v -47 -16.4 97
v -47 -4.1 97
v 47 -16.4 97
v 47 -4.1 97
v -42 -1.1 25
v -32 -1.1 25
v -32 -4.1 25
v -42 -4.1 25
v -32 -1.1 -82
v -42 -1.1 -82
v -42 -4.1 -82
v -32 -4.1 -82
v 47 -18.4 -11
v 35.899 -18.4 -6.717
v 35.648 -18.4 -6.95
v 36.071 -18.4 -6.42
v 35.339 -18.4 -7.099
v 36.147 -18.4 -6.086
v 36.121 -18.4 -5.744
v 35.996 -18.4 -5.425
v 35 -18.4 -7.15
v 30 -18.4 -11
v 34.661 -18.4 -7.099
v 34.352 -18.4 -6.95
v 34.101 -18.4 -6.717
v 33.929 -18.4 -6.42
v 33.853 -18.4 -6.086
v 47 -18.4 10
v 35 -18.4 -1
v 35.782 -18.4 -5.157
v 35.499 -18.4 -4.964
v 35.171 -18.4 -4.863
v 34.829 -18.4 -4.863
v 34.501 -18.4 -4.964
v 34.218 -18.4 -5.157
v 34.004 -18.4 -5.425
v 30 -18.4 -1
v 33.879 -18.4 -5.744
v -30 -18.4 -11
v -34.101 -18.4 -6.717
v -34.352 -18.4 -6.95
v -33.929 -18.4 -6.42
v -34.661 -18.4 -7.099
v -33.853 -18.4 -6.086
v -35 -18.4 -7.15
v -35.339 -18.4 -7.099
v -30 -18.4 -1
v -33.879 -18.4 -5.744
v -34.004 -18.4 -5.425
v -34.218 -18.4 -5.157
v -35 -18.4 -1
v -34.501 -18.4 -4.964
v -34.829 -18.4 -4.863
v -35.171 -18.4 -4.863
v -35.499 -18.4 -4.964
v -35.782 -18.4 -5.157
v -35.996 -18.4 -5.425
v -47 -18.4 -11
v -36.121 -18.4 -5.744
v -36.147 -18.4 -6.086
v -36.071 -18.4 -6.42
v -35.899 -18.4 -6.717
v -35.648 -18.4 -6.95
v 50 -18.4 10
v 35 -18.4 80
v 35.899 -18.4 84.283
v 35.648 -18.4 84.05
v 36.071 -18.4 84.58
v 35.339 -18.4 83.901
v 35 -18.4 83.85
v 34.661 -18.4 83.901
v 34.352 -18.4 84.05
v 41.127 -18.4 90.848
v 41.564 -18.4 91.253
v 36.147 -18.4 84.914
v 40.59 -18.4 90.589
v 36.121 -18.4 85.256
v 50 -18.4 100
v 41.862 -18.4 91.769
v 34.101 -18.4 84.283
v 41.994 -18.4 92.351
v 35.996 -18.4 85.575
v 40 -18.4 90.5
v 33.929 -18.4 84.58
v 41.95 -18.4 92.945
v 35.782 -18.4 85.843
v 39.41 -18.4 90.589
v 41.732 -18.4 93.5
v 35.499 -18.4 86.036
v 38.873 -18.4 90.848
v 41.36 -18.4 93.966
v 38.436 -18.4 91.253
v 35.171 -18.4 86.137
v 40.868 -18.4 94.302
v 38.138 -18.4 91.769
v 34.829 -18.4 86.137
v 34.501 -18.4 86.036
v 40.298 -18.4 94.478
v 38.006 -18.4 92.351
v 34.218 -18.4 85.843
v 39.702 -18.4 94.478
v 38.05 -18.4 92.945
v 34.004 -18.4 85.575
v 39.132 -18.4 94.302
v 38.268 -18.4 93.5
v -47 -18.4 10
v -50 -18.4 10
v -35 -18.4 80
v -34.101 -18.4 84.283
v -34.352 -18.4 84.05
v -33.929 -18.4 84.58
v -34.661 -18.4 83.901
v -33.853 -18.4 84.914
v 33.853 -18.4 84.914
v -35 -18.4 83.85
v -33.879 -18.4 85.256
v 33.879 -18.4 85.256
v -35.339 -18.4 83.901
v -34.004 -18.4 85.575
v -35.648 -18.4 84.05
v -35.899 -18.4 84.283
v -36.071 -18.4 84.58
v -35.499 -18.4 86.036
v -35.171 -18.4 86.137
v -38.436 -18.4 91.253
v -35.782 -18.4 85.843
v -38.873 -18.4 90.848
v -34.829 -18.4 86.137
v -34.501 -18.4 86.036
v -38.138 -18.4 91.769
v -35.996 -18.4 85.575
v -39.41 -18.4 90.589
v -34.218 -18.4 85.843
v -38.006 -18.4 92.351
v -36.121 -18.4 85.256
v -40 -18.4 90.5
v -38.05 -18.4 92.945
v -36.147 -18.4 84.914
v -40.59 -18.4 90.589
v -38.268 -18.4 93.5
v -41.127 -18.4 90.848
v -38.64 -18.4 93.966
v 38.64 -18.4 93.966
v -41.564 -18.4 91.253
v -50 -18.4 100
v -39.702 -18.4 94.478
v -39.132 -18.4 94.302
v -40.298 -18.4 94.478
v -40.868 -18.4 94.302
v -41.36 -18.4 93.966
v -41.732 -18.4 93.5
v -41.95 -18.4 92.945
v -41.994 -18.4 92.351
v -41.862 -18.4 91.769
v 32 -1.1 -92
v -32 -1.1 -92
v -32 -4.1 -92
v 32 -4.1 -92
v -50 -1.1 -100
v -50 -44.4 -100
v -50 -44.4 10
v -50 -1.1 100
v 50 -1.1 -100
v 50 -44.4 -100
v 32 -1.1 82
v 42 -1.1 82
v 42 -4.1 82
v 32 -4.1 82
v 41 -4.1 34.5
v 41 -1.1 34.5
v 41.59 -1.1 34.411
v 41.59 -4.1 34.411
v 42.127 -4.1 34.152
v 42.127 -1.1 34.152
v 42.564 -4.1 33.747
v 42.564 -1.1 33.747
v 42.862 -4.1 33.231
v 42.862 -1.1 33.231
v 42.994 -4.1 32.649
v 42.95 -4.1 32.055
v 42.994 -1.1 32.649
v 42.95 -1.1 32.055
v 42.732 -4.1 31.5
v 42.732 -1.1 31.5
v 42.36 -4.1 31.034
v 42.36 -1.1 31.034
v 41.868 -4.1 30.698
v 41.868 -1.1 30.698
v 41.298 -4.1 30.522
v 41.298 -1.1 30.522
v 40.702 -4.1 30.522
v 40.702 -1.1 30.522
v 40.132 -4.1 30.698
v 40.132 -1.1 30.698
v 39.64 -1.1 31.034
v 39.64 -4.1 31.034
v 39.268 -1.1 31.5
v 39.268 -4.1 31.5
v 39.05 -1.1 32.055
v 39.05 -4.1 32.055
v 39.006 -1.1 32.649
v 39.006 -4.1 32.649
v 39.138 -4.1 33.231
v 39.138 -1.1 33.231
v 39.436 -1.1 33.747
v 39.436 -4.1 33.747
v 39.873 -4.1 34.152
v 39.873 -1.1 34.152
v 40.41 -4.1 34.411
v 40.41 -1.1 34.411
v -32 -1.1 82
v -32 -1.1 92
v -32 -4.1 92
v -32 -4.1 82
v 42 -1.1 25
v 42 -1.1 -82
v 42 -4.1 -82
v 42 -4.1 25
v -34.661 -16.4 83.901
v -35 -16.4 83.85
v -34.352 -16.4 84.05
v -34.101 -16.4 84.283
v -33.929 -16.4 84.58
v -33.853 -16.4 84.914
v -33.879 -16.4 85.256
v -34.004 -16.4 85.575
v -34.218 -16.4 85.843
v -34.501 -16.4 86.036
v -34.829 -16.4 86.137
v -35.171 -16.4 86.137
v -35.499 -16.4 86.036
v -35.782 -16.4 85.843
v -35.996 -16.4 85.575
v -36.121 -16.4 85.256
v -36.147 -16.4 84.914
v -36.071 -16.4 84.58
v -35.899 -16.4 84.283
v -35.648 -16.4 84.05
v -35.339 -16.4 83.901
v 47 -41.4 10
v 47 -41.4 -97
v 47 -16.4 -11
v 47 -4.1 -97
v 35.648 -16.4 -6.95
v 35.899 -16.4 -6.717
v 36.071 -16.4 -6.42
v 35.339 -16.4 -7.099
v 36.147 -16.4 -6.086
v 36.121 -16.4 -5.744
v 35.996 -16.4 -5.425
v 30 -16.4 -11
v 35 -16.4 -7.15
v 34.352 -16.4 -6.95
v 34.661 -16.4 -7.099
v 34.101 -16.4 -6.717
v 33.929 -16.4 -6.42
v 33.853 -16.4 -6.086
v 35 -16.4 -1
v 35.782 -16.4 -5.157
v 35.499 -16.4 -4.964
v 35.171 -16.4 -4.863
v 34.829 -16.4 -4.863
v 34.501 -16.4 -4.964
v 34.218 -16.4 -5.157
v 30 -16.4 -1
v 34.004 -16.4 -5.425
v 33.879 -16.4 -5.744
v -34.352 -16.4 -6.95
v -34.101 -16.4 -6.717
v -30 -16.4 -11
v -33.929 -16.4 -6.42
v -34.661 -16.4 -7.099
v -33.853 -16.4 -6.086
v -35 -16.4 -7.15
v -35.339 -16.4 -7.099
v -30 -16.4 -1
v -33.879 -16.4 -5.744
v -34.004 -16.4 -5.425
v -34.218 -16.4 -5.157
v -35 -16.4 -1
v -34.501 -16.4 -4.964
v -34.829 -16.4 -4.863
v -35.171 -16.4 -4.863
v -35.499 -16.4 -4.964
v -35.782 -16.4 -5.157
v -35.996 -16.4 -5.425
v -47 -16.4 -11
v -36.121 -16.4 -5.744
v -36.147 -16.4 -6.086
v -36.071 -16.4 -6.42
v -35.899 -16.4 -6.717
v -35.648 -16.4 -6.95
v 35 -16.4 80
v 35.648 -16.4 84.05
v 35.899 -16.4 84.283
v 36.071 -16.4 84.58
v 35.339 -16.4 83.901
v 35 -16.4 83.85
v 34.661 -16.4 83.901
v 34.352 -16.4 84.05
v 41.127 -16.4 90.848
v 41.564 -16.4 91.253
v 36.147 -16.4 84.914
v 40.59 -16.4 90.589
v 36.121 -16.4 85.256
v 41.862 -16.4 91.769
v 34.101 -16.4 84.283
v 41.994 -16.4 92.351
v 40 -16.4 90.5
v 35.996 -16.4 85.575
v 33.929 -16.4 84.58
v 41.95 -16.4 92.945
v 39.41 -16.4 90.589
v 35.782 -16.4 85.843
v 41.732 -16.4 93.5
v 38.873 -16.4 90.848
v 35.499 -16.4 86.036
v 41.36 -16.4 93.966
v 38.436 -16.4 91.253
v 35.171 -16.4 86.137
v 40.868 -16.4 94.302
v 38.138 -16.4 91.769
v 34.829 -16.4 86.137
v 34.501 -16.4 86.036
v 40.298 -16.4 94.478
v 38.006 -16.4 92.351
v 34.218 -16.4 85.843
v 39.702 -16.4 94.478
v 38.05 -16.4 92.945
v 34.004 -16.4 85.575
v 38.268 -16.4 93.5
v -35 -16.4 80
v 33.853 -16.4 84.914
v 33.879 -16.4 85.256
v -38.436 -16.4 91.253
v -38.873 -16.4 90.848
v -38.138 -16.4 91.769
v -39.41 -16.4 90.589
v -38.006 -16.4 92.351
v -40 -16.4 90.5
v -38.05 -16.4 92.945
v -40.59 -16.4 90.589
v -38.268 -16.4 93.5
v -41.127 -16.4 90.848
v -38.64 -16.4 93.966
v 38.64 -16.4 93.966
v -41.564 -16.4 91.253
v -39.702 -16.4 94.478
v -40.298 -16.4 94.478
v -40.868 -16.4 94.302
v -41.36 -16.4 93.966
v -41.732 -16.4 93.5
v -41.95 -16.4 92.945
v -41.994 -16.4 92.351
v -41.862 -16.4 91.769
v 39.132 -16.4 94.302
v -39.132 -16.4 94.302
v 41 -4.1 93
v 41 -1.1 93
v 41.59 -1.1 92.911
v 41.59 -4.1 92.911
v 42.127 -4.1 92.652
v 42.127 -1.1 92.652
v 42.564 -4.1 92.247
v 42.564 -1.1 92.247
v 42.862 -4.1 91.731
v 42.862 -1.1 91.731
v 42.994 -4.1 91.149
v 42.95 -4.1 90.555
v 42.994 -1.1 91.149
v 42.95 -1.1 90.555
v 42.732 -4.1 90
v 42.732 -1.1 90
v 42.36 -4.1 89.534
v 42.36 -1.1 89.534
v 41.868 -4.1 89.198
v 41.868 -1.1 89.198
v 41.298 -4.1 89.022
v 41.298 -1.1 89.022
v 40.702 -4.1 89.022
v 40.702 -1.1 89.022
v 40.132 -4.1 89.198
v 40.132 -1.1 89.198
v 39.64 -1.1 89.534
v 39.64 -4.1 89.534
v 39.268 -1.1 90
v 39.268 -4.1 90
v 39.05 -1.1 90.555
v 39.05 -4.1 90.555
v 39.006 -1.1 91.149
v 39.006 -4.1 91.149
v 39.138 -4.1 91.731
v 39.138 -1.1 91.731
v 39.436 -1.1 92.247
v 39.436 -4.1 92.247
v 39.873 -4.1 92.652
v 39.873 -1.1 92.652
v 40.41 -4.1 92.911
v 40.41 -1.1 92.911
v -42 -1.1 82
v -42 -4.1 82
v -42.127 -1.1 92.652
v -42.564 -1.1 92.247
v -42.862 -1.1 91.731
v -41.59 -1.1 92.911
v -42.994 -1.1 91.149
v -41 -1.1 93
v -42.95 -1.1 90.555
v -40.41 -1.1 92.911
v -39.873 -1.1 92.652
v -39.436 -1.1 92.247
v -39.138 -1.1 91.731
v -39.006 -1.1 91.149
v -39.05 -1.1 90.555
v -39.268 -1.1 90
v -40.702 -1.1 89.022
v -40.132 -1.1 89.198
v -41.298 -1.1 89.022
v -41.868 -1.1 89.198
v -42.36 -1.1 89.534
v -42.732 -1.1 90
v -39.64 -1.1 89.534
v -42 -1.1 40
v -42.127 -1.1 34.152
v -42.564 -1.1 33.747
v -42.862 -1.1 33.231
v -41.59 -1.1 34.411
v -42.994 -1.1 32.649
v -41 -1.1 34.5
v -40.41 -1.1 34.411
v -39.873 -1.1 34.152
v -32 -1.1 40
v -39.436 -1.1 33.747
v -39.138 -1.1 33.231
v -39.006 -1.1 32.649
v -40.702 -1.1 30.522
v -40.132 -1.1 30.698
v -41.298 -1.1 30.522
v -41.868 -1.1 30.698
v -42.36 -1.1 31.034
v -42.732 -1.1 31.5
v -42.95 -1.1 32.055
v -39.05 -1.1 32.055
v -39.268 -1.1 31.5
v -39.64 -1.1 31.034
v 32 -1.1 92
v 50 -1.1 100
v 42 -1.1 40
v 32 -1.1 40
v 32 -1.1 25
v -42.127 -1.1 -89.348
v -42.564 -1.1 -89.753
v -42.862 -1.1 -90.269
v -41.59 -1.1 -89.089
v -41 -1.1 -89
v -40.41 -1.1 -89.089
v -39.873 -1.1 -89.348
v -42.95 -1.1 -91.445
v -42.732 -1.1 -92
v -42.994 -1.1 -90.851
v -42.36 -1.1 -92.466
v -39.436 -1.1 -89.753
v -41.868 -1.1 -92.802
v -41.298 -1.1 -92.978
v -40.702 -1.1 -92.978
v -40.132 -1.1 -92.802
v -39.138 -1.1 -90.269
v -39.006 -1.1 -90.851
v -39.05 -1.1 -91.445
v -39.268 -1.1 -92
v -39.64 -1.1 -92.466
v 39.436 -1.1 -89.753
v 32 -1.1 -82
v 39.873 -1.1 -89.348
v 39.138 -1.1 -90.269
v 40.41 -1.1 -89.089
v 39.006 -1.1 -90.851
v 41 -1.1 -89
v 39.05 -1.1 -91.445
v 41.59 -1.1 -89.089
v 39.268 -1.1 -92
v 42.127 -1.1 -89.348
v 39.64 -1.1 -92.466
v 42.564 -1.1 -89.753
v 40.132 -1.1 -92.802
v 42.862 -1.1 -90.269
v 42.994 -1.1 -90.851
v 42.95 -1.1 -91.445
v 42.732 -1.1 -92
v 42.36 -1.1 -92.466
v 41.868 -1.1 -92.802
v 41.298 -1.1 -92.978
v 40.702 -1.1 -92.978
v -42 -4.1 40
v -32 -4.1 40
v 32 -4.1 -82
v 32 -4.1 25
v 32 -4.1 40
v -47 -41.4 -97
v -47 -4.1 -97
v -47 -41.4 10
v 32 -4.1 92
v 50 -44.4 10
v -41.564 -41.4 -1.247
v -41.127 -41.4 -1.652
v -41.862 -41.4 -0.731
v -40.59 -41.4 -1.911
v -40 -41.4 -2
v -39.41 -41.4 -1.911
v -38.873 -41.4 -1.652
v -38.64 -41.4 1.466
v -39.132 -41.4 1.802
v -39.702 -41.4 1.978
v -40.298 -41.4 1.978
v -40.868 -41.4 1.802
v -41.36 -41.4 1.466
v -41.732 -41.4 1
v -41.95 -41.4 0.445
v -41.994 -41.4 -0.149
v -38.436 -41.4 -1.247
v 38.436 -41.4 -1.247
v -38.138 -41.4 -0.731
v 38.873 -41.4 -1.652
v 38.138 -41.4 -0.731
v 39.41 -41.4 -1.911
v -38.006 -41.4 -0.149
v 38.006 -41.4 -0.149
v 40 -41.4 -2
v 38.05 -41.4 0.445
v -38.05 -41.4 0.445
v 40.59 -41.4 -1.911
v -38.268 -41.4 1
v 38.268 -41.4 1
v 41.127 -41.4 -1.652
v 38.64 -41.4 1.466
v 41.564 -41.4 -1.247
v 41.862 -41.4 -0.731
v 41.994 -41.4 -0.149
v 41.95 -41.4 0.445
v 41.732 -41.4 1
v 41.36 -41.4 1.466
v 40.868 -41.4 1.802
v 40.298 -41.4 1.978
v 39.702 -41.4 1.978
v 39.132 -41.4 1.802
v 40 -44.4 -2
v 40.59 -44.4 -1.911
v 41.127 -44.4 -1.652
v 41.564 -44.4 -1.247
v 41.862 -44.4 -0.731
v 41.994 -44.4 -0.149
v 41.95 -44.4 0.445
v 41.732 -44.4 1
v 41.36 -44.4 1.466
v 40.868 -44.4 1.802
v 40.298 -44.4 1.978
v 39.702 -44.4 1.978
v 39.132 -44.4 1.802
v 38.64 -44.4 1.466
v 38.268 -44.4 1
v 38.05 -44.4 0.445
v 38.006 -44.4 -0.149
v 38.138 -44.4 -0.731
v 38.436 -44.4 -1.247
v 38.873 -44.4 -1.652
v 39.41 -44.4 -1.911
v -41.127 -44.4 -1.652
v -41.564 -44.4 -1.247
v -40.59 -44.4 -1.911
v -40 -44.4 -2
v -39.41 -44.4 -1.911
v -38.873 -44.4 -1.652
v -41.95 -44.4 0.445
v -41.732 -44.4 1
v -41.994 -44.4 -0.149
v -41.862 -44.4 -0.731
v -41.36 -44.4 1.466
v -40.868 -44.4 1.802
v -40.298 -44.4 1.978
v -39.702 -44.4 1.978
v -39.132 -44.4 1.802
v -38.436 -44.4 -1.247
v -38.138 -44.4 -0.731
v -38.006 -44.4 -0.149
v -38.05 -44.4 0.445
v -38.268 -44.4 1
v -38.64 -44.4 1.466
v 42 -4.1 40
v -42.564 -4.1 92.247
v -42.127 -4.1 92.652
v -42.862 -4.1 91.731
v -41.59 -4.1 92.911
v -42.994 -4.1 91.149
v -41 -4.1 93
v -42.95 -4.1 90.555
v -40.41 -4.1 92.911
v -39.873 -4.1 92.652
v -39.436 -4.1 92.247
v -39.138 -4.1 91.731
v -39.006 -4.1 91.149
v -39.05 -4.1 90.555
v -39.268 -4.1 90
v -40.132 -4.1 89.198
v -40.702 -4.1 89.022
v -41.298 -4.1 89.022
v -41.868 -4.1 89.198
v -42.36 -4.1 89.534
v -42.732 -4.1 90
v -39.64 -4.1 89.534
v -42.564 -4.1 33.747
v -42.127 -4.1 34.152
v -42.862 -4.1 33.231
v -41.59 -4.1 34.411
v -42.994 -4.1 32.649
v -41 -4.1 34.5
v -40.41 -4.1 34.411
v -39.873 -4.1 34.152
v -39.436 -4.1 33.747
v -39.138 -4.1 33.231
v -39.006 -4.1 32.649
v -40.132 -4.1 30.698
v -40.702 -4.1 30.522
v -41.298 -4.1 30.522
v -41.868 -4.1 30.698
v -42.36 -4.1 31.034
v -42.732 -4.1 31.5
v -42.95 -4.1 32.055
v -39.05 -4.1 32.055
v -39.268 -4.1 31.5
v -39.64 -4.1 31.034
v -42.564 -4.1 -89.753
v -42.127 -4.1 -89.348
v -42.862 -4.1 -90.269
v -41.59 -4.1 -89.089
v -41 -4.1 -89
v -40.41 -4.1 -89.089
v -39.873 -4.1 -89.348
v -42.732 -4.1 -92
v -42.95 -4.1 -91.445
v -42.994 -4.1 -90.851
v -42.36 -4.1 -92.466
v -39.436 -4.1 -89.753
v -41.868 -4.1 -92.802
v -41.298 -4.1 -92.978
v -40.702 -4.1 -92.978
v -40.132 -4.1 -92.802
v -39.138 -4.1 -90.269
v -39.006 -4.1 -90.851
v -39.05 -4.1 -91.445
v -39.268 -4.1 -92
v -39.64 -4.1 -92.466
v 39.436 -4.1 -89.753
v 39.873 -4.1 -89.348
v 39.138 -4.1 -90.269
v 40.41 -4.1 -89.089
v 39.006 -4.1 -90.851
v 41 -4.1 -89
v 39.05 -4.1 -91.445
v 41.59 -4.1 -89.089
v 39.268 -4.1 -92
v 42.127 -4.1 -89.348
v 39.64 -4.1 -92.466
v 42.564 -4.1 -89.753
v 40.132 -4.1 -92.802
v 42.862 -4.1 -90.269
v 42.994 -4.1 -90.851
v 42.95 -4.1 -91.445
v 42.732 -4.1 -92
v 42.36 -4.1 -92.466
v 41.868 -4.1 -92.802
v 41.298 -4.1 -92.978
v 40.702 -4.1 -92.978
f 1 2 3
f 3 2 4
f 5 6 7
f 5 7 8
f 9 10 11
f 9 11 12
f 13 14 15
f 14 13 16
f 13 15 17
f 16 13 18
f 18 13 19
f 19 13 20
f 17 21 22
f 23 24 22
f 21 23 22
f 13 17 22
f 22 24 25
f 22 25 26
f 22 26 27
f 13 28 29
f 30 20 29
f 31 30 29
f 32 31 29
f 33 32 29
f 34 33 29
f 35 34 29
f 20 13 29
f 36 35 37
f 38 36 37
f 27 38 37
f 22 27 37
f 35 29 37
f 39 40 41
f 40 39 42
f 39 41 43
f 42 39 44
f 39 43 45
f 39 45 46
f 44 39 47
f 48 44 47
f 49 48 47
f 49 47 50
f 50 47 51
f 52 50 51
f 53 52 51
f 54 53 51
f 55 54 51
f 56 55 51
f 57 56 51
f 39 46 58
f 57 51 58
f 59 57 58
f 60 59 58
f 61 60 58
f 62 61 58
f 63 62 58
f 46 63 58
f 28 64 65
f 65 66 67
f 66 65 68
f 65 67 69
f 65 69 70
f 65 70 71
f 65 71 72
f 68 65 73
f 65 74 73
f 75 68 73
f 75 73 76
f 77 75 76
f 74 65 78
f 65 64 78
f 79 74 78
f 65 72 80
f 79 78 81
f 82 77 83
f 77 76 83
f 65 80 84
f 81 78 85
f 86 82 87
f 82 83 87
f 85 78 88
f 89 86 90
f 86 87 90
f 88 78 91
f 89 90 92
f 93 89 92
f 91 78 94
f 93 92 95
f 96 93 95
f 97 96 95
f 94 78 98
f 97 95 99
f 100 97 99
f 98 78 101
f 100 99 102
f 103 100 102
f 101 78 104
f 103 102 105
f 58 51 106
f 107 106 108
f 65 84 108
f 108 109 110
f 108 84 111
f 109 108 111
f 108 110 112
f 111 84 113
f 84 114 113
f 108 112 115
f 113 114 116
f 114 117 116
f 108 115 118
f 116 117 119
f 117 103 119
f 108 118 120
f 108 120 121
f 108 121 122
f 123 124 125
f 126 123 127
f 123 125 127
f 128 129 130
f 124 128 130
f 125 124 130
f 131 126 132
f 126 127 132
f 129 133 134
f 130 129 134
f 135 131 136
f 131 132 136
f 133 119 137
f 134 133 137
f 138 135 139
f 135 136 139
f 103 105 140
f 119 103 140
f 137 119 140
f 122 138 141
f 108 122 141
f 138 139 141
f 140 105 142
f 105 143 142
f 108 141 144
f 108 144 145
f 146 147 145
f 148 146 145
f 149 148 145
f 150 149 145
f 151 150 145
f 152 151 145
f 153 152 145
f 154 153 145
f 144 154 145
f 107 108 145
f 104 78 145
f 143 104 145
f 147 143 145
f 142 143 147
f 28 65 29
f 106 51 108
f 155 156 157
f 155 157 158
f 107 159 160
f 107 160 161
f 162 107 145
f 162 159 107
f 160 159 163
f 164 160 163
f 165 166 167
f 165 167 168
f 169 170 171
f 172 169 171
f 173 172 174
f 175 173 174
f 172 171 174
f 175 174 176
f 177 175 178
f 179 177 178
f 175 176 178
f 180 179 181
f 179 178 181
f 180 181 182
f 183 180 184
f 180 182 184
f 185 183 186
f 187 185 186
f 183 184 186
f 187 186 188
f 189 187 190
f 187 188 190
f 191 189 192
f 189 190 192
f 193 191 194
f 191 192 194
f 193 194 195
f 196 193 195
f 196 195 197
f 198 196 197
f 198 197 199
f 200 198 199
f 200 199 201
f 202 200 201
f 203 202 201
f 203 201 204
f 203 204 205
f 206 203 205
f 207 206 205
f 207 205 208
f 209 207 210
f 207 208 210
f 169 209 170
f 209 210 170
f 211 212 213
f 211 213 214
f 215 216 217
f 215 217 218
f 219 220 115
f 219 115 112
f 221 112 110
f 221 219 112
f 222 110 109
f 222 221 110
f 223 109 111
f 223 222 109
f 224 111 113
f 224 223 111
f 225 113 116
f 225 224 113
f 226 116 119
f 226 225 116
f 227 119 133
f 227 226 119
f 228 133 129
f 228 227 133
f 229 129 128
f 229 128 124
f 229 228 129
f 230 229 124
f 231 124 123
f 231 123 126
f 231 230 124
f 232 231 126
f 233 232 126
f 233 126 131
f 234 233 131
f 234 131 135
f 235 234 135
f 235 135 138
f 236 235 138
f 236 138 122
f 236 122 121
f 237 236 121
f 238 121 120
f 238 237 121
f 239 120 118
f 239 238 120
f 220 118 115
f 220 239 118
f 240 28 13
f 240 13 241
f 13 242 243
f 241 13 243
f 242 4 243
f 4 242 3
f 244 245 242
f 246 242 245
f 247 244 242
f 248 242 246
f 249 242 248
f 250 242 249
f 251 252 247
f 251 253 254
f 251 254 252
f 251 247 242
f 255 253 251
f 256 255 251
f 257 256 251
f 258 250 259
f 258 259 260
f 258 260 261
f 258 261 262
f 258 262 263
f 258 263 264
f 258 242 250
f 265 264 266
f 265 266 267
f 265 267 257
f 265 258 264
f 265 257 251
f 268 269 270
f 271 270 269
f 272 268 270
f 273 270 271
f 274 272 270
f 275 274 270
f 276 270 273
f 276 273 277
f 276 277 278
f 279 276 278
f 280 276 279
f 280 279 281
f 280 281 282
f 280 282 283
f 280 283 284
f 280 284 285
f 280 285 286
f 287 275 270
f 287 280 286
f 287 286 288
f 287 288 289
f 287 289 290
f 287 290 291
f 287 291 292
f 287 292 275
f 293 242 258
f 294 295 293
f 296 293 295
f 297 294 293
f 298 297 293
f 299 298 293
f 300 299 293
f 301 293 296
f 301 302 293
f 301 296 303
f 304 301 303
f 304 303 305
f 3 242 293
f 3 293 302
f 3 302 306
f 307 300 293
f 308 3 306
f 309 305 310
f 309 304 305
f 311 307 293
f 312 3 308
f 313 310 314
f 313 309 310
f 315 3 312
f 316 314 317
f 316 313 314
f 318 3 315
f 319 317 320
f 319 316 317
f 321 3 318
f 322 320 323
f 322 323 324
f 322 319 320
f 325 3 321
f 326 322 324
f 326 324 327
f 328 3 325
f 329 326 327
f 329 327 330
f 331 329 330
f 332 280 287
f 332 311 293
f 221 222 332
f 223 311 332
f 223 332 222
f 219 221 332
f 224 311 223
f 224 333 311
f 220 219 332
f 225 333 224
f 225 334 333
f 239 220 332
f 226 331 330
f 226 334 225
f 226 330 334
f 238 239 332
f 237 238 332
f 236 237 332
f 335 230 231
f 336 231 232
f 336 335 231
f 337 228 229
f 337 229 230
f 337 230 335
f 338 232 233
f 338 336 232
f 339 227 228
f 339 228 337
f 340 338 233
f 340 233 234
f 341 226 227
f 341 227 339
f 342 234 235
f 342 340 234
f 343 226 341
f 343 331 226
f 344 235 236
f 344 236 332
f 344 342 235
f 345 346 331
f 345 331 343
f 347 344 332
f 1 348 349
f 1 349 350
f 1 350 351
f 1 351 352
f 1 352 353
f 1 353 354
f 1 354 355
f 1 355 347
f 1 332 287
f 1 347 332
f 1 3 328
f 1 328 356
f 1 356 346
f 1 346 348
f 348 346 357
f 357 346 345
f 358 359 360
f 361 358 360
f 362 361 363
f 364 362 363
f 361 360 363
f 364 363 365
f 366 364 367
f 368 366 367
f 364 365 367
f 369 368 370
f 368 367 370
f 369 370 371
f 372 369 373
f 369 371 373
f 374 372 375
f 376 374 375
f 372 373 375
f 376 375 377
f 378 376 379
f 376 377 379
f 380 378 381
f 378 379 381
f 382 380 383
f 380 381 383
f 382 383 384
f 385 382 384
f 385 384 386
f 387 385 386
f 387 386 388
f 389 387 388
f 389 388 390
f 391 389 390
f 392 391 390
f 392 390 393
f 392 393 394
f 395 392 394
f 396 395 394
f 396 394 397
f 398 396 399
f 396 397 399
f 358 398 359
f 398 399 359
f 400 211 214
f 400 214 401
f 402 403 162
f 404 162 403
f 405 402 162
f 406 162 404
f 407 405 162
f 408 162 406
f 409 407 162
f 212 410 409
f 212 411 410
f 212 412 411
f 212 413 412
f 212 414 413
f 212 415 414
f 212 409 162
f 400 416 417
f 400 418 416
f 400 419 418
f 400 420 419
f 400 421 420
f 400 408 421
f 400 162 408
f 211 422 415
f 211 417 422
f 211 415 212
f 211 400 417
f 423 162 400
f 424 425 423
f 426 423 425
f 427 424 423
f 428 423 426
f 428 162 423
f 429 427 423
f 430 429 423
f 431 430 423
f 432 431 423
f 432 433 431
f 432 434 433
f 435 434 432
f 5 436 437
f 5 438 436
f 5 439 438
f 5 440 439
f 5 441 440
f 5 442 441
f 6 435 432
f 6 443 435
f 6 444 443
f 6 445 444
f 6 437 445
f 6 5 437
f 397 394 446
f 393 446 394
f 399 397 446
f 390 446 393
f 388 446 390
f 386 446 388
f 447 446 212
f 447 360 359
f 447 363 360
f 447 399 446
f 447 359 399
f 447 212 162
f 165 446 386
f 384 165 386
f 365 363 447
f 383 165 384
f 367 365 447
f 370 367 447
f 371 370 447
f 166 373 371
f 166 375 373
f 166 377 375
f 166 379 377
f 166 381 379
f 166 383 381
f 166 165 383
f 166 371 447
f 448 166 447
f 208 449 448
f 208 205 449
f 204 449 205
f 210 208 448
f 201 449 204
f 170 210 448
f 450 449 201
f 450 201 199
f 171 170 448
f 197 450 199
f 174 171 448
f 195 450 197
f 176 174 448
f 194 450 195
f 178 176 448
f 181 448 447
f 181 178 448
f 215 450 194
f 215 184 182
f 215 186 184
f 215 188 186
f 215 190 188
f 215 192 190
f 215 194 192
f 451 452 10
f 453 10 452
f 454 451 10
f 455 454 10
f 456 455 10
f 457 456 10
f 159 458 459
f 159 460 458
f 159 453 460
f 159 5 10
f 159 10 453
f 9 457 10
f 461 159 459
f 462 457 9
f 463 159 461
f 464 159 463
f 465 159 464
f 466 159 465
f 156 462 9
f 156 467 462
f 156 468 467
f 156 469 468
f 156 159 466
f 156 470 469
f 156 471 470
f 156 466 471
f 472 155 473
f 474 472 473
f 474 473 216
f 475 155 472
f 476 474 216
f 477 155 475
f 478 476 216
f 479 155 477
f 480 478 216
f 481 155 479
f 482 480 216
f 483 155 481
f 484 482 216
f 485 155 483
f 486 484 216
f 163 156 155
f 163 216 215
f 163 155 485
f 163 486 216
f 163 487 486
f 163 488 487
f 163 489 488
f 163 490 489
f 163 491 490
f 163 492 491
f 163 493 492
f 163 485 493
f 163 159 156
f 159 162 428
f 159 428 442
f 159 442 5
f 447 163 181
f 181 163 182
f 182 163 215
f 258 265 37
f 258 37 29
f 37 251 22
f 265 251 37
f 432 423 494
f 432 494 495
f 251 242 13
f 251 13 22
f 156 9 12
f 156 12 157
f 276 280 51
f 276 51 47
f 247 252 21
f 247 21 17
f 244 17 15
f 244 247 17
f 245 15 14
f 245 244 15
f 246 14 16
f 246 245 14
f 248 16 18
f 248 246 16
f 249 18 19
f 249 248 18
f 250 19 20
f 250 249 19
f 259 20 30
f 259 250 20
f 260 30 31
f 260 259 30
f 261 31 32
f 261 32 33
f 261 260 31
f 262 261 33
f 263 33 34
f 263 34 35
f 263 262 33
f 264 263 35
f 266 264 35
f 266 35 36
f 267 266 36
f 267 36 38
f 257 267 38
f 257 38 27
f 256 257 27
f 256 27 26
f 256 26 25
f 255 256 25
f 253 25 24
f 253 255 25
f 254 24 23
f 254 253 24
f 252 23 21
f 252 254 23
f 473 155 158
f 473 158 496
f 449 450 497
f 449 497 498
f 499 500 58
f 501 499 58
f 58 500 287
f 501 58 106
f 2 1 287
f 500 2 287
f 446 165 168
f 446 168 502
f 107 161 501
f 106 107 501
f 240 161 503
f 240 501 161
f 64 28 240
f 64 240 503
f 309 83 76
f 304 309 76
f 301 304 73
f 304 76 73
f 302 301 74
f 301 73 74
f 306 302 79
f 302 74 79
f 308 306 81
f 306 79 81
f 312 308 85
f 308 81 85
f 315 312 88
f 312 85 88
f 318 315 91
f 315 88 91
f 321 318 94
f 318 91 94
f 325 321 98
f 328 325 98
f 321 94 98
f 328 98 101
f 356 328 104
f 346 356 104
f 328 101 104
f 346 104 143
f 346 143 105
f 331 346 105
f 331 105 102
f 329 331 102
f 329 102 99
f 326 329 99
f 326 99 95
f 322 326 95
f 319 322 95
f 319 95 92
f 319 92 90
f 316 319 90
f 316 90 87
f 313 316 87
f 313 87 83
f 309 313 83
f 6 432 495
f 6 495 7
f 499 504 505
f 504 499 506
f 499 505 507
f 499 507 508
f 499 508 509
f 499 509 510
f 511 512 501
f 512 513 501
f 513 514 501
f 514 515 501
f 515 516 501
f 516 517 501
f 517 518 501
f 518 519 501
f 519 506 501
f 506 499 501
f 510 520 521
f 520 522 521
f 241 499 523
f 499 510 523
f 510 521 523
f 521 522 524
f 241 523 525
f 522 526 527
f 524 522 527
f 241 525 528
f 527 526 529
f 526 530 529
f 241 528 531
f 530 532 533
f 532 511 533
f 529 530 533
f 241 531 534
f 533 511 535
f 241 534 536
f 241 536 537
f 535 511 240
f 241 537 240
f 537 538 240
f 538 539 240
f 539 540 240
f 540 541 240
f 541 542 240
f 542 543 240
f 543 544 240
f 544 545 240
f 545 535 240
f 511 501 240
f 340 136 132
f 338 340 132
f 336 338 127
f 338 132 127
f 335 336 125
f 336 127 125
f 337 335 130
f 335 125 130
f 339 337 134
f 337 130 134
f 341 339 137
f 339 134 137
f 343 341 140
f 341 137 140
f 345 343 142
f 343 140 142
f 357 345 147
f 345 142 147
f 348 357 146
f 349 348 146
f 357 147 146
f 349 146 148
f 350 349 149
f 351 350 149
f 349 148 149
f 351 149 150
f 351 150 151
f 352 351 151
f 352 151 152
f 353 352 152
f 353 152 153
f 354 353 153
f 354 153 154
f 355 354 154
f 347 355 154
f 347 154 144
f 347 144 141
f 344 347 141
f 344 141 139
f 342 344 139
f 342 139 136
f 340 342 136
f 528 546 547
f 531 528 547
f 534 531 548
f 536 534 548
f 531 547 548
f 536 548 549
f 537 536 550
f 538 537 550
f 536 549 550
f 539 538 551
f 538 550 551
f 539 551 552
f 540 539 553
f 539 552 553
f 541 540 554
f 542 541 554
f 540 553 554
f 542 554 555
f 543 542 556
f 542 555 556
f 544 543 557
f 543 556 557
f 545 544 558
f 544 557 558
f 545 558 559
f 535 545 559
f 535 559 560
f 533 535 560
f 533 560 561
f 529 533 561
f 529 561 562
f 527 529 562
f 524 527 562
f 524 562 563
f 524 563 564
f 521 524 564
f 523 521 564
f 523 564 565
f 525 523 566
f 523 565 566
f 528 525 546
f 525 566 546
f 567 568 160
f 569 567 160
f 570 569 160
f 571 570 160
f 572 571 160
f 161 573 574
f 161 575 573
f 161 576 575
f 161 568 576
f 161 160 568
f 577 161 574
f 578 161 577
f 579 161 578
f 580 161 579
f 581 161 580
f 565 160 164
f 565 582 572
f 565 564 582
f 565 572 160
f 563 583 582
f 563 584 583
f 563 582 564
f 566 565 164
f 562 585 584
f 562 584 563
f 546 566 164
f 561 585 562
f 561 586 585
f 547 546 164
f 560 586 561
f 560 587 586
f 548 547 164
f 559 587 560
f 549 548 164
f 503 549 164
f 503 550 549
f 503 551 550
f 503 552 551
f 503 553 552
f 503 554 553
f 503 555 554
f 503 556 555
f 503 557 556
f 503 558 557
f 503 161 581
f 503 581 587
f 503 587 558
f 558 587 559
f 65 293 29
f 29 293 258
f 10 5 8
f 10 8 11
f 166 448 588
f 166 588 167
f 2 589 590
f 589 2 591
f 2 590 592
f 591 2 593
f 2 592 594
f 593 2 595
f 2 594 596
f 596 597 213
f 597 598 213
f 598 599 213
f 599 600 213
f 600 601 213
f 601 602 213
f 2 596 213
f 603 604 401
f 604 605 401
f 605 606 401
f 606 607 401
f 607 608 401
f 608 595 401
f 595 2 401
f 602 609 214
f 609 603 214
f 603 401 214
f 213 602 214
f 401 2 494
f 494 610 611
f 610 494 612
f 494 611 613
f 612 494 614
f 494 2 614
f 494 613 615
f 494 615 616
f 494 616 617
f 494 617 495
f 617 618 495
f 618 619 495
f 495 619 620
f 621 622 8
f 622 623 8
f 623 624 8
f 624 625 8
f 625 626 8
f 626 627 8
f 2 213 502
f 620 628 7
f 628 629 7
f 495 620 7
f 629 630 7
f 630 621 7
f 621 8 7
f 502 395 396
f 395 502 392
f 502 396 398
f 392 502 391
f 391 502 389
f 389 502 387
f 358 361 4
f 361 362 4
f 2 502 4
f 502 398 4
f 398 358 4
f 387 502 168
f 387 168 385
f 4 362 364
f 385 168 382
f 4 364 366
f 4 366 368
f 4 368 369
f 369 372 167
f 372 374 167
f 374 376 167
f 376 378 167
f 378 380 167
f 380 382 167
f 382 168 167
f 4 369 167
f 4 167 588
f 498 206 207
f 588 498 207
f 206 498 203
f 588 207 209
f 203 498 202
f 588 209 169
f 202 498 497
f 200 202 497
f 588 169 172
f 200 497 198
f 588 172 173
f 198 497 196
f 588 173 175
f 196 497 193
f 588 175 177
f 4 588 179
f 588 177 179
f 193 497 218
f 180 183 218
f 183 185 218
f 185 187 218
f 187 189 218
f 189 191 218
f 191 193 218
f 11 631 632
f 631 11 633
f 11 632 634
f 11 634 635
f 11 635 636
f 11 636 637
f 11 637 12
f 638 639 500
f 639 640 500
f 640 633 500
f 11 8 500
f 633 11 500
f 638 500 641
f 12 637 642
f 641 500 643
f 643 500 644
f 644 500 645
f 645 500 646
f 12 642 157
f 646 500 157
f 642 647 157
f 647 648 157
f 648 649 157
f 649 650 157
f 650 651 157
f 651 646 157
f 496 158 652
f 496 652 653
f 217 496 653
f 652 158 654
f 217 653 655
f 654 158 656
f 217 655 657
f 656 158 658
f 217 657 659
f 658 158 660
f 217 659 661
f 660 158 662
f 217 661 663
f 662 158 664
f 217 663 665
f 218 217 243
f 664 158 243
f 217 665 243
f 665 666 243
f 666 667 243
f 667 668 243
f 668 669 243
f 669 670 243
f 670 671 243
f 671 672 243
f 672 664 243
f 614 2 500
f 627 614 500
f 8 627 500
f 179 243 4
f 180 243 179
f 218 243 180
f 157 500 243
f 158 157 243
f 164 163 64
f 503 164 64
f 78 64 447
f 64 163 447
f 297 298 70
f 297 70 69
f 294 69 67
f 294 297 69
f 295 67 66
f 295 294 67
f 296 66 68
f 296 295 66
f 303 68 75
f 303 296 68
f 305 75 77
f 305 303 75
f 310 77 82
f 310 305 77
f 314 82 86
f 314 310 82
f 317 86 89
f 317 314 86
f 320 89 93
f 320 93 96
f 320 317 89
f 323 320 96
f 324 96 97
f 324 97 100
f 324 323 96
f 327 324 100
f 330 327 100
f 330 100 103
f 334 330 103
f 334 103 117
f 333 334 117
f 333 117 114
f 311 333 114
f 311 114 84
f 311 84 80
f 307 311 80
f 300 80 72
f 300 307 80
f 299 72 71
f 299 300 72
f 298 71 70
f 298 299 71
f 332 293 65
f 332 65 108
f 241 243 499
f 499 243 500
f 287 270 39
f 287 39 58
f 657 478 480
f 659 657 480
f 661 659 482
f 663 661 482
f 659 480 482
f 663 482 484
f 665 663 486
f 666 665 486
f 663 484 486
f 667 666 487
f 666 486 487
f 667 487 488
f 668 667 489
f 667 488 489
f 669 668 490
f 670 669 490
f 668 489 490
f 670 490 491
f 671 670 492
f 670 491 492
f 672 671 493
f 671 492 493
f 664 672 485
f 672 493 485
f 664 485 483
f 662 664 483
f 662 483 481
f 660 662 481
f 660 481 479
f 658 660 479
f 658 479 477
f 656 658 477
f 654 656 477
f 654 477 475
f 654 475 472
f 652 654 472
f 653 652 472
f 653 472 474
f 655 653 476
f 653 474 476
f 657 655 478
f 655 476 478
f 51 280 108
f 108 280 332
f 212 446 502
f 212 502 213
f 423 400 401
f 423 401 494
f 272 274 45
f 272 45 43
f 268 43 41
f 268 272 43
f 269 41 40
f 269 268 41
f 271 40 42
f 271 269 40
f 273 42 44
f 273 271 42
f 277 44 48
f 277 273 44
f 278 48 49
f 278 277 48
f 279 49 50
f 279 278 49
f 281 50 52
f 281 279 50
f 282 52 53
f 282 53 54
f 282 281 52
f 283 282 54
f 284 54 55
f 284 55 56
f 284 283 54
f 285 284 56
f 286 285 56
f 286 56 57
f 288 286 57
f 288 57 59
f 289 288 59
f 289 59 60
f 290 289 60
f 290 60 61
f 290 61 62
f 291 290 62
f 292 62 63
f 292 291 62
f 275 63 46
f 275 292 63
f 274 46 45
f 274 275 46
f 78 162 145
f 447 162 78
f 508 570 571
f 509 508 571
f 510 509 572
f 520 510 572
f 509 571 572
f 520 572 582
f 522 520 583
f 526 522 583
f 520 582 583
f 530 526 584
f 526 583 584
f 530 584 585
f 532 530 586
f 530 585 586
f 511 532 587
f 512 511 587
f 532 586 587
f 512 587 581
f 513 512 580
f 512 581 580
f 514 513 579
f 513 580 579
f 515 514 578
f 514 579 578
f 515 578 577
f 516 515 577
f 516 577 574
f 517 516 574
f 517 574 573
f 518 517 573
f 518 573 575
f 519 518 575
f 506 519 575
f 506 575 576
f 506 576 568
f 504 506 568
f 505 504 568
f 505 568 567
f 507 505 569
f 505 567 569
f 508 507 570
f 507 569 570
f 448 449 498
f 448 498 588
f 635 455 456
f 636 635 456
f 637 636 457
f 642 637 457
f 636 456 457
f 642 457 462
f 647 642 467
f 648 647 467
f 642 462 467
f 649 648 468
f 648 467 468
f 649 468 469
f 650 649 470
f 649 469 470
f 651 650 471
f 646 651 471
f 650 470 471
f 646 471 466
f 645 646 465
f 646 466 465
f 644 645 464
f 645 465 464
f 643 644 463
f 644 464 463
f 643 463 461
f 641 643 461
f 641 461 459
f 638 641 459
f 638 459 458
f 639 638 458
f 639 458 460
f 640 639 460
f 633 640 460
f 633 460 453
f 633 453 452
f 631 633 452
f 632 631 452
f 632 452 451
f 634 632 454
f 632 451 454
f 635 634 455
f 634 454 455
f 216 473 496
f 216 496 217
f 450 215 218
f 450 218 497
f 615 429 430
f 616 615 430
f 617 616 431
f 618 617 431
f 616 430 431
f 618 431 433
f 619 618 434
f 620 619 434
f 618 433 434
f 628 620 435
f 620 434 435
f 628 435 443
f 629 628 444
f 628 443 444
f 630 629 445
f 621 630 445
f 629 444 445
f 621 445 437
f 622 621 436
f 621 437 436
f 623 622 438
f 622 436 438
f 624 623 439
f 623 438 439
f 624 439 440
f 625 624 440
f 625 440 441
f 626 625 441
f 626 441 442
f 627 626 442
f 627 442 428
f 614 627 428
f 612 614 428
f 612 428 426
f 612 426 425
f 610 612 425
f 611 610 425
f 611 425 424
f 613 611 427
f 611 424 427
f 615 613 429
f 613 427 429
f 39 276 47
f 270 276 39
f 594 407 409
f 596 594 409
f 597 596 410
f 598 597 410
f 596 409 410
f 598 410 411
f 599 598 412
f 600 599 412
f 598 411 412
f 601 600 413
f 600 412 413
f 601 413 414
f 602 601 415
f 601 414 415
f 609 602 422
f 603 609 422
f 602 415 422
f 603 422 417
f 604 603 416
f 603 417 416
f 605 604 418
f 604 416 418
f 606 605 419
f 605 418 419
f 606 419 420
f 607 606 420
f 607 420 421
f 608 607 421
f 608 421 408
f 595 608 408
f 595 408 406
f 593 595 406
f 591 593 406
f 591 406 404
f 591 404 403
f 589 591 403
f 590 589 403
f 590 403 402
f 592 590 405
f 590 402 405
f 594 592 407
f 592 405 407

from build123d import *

# Parameters (mm, degrees)
SKETCH1_W           = 100
SKETCH1_H           = 200
SKETCH1_W_2         = 67
SKETCH1_H_2         = 110
BOSS_EXTRUDE1_DEPTH = 2
SKETCH2_W           = 100
SKETCH2_H           = 200
SKETCH2_W_2         = 94
SKETCH2_H_2         = 194
BOSS_EXTRUDE2_DEPTH = 16.4
SKETCH3_R           = 1.15
BOSS_EXTRUDE3_DEPTH = 2
BOSS_EXTRUDE4_DEPTH = 25
SKETCH8_W           = 100
SKETCH8_H           = 110
BOSS_EXTRUDE5_DEPTH = 3
SKETCH9_W           = 11
SKETCH9_H           = 13
CUT_EXTRUDE2_DEPTH  = 36
SKETCH13_W          = 141.504865249
SKETCH13_H          = 212.967188503
CUT_EXTRUDE6_DEPTH  = 3.1
SKETCH14_W          = 94
SKETCH14_H          = 194
BOSS_EXTRUDE6_DEPTH = 3
CUT_EXTRUDE7_DEPTH  = 3
SKETCH15_R          = 2
CUT_EXTRUDE8_DEPTH  = 3
SKETCH16_R          = 2
CUT_EXTRUDE9_DEPTH  = 3
SKETCH17_R          = 2
CUT_EXTRUDE10_DEPTH = 3


with BuildPart() as part:
    # Sketch1 → Boss-Extrude1 (new body)
    with BuildSketch(Plane(origin=(0, 0, 0), x_dir=(1, 0, 0), z_dir=(0, 1, 0))):
        Rectangle(SKETCH1_W, SKETCH1_H)
        with Locations((0, 35)):
            Rectangle(SKETCH1_W_2, SKETCH1_H_2, mode=Mode.SUBTRACT)
    extrude(amount=BOSS_EXTRUDE1_DEPTH)

    # Sketch2 → Boss-Extrude2 (add)
    with BuildSketch(Plane.XZ):
        Rectangle(SKETCH2_W, SKETCH2_H)
        Rectangle(SKETCH2_W_2, SKETCH2_H_2, mode=Mode.SUBTRACT)
    extrude(amount=BOSS_EXTRUDE2_DEPTH)

    # Sketch3 → Boss-Extrude3 (add)
    with BuildSketch(Plane.XZ.offset(16.4)):
        Polygon((-50, 100), (50, 100), (50, 10), (50, -11), (30, -11), (30, -1), (35, -1), (35, 10), (35, 80), (-35, 80), (-35, 10), (-35, -1), (-30, -1), (-30, -11), (-50, -11), (-50, 10), align=None)
        with Locations((-35, 85)):
            Circle(SKETCH3_R, mode=Mode.SUBTRACT)
        with Locations((35, 85)):
            Circle(SKETCH3_R, mode=Mode.SUBTRACT)
        with Locations((-35, -6)):
            Circle(SKETCH3_R, mode=Mode.SUBTRACT)
        with Locations((35, -6)):
            Circle(SKETCH3_R, mode=Mode.SUBTRACT)
    extrude(amount=BOSS_EXTRUDE3_DEPTH)

    # Sketch5 → Boss-Extrude4 (add)
    with BuildSketch(Plane.XZ.offset(16.4)):
        Polygon((-50, -100), (50, -100), (50, -97), (50, 10), (47, 10), (47, -97), (-47, -97), (-47, 10), (-50, 10), (-50, -97), align=None)
    extrude(amount=BOSS_EXTRUDE4_DEPTH)

    # Sketch8 → Boss-Extrude5 (add)
    with BuildSketch(Plane.XZ.offset(41.4)):
        with Locations((0, -45)):
            Rectangle(SKETCH8_W, SKETCH8_H)
    extrude(amount=BOSS_EXTRUDE5_DEPTH)

    # Sketch9 → Cut-Extrude2 (cut)
    with BuildSketch(Plane(origin=(0, -16.4, 0), x_dir=(1, 0, 0), z_dir=(0, 1, 0))):
        with Locations((-28.65, -74.5)):
            Rectangle(SKETCH9_W, SKETCH9_H)
        with Locations((-0.71, -74.5)):
            Rectangle(SKETCH9_W, SKETCH9_H)
        with Locations((24.69, -74.5)):
            Rectangle(SKETCH9_W, SKETCH9_H)
        with Locations((-28.65, -49.1)):
            Rectangle(SKETCH9_W, SKETCH9_H)
        with Locations((-0.71, -49.1)):
            Rectangle(SKETCH9_W, SKETCH9_H)
        with Locations((24.69, -49.1)):
            Rectangle(SKETCH9_W, SKETCH9_H)
    extrude(amount=CUT_EXTRUDE2_DEPTH, mode=Mode.SUBTRACT)

    # Sketch13 → Cut-Extrude6 (cut)
    with BuildSketch(Plane(origin=(0, 2, 0), x_dir=(1, 0, 0), z_dir=(0, 1, 0))):
        with Locations((7.572166702, -0.236630209)):
            Rectangle(SKETCH13_W, SKETCH13_H)
    extrude(amount=-CUT_EXTRUDE6_DEPTH, mode=Mode.SUBTRACT)

    # Sketch14 → Boss-Extrude6 (add)
    with BuildSketch(Plane(origin=(0, -1.1, 0), x_dir=(1, 0, 0), z_dir=(0, 1, 0))):
        Rectangle(SKETCH14_W, SKETCH14_H)
    extrude(amount=-BOSS_EXTRUDE6_DEPTH)

    # Sketch14<4> → Cut-Extrude7 (cut)
    with BuildSketch(Plane(origin=(0, -1.1, 0), x_dir=(1, 0, 0), z_dir=(0, 1, 0))):
        Polygon((-32, 92), (32, 92), (32, 82), (42, 82), (42, -25), (32, -25), (32, -40), (42, -40), (42, -82), (32, -82), (32, -92), (-32, -92), (-32, -82), (-42, -82), (-42, -40), (-32, -40), (-32, -25), (-42, -25), (-42, 82), (-32, 82), align=None)
    extrude(amount=-CUT_EXTRUDE7_DEPTH, mode=Mode.SUBTRACT)

    # Sketch15 → Cut-Extrude8 (cut)
    with BuildSketch(Plane.XZ.offset(44.4)):
        with Locations((-40, 0)):
            Circle(SKETCH15_R)
        with Locations((40, 0)):
            Circle(SKETCH15_R)
    extrude(amount=-CUT_EXTRUDE8_DEPTH, mode=Mode.SUBTRACT)

    # Sketch16 → Cut-Extrude9 (cut)
    with BuildSketch(Plane.XZ.offset(18.4)):
        with Locations((-40, 92.5)):
            Circle(SKETCH16_R)
        with Locations((40, 92.5)):
            Circle(SKETCH16_R)
    extrude(amount=-CUT_EXTRUDE9_DEPTH, mode=Mode.SUBTRACT)

    # Sketch17 → Cut-Extrude10 (cut)
    with BuildSketch(Plane(origin=(0, -1.1, 0), x_dir=(1, 0, 0), z_dir=(0, 1, 0))):
        with Locations((-41, 91)):
            Circle(SKETCH17_R)
        with Locations((41, 91)):
            Circle(SKETCH17_R)
        with Locations((-41, -32.5)):
            Circle(SKETCH17_R)
        with Locations((41, -32.5)):
            Circle(SKETCH17_R)
        with Locations((-41, -91)):
            Circle(SKETCH17_R)
        with Locations((41, -91)):
            Circle(SKETCH17_R)
    extrude(amount=-CUT_EXTRUDE10_DEPTH, mode=Mode.SUBTRACT)


solid = part.part
